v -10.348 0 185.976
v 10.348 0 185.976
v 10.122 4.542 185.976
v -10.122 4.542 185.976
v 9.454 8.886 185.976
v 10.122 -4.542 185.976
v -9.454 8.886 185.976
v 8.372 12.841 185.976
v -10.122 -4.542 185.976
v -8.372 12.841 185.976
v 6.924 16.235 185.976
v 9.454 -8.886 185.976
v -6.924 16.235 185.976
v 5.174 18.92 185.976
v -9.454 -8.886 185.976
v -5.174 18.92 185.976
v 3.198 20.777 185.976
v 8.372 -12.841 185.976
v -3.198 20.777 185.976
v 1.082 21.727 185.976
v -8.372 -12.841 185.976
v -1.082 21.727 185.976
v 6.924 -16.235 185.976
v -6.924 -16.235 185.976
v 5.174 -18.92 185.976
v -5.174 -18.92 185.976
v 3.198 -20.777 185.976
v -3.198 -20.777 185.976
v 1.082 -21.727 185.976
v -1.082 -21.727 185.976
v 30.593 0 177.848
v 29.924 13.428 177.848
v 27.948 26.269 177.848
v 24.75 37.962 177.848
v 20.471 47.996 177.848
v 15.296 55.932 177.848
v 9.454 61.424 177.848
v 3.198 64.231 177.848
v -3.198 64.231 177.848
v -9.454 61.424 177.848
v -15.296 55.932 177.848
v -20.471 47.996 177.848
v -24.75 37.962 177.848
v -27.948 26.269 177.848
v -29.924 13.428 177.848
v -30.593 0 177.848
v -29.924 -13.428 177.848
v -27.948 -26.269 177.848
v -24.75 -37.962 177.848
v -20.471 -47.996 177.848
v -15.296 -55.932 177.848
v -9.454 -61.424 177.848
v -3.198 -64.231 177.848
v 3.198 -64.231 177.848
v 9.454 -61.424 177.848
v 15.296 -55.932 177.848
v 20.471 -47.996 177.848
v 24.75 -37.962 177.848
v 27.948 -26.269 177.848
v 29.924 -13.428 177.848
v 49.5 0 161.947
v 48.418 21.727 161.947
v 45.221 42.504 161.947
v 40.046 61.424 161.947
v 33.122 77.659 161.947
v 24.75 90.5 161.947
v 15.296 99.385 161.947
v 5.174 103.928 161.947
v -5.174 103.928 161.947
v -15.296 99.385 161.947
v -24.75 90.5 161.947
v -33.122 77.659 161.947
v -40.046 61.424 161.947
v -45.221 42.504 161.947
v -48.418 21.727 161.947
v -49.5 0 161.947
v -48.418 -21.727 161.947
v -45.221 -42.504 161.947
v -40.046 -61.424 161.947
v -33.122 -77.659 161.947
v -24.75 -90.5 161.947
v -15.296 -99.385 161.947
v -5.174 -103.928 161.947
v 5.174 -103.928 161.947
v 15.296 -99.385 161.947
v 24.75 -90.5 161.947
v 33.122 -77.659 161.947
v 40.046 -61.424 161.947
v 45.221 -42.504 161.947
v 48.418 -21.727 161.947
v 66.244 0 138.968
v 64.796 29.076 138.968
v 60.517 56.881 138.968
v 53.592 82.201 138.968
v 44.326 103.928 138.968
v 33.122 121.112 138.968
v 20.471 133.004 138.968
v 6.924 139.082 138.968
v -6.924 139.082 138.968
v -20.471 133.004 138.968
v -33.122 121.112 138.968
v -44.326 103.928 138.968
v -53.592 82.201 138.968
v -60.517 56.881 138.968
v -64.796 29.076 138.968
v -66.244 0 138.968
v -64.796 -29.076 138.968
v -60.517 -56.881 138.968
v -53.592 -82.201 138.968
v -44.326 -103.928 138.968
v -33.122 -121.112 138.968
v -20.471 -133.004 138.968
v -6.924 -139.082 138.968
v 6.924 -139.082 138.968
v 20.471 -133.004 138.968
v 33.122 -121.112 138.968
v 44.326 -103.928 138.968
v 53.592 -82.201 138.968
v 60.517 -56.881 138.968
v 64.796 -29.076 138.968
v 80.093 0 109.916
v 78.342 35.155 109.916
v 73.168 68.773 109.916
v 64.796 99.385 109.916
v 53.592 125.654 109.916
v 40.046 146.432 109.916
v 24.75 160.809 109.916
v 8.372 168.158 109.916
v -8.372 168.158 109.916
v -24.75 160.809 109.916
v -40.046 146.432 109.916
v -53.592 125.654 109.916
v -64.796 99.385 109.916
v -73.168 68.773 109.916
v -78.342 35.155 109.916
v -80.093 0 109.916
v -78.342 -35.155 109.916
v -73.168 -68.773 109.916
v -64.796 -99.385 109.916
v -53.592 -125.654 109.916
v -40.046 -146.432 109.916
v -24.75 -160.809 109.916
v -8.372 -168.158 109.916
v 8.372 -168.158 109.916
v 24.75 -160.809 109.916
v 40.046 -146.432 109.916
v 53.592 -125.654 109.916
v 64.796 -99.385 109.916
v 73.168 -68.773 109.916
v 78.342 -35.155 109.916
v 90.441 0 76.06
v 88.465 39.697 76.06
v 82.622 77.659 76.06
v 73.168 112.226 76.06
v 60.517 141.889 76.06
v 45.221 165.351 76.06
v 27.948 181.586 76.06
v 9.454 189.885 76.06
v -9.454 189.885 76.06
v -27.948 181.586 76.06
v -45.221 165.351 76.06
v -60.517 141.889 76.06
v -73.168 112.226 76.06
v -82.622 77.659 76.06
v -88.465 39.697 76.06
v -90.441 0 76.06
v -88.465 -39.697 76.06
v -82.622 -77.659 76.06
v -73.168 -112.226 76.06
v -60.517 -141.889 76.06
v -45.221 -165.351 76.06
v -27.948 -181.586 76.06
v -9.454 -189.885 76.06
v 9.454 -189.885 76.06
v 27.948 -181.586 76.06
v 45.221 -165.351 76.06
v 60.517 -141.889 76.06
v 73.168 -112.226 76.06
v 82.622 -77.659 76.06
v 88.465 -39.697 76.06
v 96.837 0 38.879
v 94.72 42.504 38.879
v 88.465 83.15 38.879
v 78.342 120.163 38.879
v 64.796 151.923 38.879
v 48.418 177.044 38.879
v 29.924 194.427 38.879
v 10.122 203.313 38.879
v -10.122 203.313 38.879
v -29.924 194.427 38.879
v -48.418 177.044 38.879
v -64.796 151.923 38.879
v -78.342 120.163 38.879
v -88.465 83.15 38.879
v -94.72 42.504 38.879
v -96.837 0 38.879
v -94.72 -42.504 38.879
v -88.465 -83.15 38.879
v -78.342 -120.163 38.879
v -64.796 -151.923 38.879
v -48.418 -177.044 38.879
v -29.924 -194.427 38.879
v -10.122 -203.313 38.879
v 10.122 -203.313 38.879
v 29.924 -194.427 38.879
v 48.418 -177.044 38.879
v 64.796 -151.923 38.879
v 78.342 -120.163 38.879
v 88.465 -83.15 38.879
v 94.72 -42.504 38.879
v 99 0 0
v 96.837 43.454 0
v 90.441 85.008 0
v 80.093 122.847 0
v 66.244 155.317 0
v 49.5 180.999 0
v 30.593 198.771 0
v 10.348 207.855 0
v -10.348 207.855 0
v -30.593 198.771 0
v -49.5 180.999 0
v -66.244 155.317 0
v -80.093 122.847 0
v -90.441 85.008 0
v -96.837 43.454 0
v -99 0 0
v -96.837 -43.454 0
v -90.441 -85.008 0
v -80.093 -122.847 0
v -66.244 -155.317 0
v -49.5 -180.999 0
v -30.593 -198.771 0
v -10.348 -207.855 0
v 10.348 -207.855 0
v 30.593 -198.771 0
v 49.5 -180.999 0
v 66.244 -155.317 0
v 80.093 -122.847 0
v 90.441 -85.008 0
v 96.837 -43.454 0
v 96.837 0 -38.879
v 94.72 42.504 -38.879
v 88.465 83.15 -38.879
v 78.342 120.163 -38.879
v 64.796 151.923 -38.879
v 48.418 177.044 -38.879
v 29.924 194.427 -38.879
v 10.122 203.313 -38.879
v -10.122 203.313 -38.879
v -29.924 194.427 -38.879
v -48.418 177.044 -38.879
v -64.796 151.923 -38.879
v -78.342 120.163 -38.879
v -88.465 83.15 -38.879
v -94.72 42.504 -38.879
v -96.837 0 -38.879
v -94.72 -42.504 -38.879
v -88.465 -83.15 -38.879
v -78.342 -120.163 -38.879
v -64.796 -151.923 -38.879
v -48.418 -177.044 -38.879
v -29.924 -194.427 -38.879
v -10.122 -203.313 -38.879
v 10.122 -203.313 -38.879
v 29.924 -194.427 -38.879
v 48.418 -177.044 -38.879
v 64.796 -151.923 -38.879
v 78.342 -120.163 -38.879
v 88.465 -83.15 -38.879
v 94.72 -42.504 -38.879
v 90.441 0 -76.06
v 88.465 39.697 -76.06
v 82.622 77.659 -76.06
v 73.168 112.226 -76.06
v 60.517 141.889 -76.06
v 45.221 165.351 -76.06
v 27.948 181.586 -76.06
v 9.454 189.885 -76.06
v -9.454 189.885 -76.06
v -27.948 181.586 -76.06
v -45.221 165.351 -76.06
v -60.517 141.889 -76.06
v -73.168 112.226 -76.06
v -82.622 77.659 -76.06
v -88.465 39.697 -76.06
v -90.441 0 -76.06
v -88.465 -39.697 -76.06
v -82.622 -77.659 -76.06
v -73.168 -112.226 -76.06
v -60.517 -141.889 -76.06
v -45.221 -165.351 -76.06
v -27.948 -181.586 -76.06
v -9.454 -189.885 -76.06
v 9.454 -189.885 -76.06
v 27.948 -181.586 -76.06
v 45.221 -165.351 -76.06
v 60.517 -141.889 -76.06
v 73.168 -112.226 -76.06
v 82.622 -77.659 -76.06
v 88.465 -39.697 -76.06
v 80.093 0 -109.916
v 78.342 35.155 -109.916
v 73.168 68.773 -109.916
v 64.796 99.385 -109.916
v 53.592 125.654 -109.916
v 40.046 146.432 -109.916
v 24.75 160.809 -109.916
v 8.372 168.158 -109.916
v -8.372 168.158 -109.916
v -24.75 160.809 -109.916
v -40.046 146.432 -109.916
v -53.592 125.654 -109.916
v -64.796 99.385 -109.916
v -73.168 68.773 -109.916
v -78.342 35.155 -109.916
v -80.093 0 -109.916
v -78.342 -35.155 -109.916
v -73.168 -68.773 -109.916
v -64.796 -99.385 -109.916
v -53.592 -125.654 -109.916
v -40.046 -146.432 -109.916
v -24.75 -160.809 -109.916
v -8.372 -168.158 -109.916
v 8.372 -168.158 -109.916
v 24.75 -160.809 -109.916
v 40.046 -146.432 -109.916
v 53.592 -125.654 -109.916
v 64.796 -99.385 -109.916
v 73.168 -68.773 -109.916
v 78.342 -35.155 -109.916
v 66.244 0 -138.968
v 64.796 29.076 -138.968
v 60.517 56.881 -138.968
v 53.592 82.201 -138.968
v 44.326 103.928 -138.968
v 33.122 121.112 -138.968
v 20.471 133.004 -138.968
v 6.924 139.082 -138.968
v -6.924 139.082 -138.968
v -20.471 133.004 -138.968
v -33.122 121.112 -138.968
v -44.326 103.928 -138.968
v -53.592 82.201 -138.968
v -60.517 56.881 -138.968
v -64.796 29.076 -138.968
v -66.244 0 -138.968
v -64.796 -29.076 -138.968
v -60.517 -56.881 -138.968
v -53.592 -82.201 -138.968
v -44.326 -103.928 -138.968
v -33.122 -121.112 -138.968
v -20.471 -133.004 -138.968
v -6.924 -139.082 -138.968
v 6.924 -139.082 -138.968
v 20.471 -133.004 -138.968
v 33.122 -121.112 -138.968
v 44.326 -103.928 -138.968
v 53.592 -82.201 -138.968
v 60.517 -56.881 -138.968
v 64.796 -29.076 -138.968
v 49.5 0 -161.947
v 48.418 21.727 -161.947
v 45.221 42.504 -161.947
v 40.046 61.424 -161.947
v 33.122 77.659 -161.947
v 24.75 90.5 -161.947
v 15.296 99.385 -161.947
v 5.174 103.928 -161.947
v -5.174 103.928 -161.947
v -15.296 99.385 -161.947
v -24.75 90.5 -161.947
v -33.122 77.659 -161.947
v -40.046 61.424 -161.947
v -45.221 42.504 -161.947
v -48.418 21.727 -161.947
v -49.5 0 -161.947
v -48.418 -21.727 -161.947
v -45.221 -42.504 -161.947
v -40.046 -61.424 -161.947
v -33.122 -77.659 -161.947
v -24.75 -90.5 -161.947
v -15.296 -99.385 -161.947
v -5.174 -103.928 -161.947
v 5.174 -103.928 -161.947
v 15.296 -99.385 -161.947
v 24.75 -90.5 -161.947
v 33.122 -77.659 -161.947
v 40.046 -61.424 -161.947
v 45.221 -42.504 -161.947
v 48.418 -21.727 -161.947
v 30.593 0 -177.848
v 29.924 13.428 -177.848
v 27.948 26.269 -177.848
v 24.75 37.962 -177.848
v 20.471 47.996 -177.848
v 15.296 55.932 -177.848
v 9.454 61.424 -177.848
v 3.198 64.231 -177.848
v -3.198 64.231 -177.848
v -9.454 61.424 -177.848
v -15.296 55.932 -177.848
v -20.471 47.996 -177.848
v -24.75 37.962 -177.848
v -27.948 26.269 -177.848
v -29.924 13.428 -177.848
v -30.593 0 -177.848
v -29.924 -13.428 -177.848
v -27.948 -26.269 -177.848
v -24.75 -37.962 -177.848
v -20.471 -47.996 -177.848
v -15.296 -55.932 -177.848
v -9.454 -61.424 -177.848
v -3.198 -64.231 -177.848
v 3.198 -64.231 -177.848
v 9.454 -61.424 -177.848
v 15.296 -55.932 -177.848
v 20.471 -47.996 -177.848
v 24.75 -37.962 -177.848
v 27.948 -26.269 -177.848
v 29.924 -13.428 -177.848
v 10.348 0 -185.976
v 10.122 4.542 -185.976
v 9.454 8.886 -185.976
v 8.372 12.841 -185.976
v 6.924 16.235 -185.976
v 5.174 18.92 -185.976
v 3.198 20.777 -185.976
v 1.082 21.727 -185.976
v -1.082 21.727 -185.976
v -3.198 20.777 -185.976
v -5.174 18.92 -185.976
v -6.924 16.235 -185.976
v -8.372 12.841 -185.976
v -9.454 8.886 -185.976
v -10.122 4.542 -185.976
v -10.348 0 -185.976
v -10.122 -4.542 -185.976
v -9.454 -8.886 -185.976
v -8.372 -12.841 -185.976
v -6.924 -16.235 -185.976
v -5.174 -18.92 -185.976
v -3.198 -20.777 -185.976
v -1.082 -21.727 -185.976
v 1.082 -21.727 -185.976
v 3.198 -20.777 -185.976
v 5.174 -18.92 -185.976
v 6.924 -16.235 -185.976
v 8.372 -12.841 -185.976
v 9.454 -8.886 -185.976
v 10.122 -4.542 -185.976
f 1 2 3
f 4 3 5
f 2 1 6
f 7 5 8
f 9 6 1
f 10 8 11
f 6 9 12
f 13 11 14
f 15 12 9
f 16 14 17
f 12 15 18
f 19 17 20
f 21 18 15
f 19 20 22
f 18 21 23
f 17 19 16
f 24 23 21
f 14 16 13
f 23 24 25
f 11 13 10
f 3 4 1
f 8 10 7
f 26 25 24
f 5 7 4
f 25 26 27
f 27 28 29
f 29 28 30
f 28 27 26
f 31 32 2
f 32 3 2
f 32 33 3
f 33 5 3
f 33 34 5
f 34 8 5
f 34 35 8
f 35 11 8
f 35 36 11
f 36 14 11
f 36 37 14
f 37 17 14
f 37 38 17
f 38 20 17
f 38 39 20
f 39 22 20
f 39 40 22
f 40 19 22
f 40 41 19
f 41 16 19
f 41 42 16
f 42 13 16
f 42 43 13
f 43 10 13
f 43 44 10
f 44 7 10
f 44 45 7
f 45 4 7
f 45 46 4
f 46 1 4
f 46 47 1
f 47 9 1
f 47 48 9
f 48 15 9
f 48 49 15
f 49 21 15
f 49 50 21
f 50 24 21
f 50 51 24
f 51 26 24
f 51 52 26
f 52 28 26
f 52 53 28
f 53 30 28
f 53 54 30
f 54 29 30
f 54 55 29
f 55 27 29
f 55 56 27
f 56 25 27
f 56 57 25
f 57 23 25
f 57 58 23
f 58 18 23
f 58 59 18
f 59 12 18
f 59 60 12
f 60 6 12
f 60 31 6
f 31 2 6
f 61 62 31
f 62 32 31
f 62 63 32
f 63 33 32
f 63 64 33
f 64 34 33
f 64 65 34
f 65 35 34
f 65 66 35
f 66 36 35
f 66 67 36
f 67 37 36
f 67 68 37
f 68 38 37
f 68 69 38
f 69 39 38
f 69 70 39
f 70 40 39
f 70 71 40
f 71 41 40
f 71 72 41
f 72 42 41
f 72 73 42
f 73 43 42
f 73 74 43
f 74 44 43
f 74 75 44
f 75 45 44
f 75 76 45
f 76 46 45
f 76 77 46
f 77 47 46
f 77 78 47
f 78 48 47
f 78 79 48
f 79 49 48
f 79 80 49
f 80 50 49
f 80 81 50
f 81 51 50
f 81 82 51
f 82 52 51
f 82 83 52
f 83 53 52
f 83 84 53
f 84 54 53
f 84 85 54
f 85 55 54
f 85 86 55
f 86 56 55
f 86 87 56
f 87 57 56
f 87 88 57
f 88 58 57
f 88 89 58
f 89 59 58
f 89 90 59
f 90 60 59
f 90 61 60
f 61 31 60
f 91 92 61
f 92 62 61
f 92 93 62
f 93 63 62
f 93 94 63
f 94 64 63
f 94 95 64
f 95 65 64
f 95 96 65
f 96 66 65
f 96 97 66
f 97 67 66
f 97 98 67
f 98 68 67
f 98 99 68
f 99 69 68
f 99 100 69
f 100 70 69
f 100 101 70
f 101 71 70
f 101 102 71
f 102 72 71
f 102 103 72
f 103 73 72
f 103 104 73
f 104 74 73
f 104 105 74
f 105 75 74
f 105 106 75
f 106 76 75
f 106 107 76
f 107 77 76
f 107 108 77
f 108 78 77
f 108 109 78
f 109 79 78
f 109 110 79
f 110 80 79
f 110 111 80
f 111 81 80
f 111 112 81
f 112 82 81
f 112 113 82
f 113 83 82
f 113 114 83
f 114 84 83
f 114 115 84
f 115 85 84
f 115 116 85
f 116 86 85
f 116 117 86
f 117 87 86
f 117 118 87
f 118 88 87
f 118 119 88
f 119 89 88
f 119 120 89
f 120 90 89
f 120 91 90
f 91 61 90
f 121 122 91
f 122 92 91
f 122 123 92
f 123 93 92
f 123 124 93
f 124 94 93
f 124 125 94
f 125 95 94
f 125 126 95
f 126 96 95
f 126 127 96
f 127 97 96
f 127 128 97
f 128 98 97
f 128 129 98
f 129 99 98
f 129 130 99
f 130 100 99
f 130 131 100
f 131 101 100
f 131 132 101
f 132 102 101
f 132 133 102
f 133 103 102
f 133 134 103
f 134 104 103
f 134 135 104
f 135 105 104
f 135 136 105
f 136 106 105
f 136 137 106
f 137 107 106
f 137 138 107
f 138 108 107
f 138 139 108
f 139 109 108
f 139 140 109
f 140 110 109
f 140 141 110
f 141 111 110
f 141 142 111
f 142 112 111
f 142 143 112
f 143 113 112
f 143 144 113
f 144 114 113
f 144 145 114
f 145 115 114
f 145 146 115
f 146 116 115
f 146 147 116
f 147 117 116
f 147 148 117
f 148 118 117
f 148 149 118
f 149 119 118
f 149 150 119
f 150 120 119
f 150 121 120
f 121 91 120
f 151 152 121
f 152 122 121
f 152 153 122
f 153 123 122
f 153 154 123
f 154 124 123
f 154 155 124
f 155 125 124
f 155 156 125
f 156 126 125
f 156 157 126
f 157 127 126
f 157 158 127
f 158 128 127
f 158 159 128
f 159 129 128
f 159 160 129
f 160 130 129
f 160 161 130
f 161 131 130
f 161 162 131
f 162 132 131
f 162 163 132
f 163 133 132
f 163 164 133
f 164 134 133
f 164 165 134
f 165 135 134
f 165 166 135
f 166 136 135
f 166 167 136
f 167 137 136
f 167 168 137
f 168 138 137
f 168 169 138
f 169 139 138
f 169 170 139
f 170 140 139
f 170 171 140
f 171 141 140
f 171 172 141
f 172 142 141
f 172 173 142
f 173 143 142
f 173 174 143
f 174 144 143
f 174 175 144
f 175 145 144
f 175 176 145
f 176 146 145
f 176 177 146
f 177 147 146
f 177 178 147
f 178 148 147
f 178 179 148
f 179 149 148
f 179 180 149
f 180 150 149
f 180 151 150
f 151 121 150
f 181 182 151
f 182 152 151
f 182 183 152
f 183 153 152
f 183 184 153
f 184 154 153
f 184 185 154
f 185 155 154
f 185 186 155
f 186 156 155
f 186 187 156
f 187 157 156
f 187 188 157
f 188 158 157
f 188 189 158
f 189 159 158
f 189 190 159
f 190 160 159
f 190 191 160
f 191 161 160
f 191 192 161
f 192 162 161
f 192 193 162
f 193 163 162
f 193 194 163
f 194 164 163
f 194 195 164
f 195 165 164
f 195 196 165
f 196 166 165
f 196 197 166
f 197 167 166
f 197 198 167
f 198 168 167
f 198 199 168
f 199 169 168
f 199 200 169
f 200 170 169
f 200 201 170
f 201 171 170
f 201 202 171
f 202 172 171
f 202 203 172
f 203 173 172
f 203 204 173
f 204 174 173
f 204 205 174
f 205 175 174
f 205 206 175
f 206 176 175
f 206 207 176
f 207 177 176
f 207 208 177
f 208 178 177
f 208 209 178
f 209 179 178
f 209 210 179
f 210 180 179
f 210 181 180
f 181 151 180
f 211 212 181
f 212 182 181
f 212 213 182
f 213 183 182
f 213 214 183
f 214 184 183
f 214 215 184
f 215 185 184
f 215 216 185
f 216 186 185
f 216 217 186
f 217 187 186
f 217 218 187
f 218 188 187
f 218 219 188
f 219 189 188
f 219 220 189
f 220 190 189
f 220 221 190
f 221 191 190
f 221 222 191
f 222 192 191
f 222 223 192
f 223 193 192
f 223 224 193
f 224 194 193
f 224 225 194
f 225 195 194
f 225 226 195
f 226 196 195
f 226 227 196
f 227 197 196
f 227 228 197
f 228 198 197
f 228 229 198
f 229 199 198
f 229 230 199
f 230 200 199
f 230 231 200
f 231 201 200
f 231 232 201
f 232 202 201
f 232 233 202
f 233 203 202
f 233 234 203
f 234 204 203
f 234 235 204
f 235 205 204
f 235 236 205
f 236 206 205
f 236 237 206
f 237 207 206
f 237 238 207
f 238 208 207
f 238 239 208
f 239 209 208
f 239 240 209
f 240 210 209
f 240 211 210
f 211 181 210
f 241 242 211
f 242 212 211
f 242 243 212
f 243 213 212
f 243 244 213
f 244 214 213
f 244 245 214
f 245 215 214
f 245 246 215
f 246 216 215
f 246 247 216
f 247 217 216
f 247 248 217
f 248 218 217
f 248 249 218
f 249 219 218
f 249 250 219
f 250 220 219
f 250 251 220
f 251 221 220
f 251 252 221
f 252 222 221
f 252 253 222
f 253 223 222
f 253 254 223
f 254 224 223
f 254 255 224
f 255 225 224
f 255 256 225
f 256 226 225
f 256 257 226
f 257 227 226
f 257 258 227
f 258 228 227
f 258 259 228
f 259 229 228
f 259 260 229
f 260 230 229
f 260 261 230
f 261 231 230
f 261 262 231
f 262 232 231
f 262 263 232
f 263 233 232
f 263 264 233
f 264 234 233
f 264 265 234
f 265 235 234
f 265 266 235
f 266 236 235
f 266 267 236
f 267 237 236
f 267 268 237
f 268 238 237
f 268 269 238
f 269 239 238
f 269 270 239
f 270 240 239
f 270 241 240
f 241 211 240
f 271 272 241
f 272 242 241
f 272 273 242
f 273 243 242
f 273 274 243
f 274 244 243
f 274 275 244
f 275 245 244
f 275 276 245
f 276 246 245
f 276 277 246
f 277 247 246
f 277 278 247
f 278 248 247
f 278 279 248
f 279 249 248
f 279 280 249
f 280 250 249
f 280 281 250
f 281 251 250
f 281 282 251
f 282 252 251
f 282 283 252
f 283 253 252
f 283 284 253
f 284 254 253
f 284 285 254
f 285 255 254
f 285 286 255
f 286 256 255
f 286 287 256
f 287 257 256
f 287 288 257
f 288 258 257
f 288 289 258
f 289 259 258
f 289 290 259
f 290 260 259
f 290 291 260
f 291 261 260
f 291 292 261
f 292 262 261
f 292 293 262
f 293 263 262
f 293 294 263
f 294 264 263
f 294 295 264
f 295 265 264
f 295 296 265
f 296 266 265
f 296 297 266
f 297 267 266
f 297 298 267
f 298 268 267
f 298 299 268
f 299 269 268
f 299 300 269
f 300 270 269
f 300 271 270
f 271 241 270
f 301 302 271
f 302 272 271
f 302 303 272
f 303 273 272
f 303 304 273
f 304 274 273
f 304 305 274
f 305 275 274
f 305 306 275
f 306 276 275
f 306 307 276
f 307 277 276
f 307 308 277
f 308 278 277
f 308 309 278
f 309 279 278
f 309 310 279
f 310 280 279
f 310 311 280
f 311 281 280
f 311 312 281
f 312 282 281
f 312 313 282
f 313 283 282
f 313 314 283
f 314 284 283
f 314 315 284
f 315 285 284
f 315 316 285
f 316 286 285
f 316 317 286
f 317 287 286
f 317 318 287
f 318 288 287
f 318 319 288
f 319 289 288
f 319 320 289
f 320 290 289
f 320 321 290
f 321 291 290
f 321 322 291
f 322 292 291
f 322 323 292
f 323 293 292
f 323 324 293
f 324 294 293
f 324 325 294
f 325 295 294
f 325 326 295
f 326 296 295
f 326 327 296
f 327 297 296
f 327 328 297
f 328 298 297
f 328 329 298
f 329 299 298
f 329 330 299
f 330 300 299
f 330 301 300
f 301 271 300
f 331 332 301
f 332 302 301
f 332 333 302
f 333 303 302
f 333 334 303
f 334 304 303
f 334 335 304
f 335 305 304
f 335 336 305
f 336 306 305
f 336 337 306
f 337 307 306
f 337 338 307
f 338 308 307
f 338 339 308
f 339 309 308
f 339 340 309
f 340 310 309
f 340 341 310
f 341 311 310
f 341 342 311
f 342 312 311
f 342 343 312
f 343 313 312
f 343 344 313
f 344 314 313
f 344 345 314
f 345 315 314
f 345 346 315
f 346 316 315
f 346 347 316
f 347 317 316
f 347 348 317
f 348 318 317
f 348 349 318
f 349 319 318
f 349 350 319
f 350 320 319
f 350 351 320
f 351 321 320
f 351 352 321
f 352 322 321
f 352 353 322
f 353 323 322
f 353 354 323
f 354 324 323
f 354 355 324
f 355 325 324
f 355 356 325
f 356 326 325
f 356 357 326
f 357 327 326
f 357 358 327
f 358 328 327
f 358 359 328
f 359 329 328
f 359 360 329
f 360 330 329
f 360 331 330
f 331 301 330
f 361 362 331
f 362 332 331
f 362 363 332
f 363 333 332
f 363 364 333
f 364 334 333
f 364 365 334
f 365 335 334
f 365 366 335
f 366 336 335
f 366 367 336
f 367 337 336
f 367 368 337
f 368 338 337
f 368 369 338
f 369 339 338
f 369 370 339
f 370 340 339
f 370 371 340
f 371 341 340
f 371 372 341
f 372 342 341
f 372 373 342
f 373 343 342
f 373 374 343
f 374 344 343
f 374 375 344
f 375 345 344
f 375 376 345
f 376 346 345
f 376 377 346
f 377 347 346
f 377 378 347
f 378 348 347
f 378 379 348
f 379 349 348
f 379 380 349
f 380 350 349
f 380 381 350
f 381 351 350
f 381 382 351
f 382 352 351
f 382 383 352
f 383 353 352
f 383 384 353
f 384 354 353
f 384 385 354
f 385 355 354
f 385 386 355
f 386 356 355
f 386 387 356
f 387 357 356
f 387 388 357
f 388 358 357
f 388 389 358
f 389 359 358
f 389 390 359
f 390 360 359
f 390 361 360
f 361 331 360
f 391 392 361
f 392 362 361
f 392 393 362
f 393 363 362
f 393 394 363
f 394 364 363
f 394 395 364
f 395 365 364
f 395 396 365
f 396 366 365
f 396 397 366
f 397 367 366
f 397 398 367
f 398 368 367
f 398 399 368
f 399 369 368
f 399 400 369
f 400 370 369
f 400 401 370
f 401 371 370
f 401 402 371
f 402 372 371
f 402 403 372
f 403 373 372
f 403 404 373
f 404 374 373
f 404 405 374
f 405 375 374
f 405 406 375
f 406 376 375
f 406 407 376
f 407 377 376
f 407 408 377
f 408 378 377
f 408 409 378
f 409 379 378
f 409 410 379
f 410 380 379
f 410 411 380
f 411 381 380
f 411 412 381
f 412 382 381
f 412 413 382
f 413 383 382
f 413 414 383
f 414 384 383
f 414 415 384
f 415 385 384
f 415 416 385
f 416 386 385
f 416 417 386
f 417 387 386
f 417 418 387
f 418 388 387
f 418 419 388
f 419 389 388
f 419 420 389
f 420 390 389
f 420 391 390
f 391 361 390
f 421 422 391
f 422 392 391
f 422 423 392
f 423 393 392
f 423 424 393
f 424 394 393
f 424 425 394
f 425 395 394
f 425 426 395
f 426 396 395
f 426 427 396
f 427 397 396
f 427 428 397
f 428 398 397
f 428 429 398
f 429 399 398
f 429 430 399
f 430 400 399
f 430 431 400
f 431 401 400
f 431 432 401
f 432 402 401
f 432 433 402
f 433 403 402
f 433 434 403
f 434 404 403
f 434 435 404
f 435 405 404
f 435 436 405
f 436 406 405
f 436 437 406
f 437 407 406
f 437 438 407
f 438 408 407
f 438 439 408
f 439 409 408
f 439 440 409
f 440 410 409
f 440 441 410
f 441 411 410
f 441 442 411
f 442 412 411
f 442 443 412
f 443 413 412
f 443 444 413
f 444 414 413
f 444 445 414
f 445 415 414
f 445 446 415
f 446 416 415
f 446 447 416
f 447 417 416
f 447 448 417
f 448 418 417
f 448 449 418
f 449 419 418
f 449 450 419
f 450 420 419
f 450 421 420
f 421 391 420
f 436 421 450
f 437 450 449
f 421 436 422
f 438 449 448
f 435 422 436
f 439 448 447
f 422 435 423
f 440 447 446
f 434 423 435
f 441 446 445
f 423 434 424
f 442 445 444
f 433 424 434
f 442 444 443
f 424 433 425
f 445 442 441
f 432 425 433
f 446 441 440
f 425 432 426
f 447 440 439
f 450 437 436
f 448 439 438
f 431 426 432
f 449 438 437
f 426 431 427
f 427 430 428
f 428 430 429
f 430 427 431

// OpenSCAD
// Generated by SolidPython 1.0.1 on 2020-07-29 00:46:49


scale(v = [9, 19, 17]) {
	sphere(r = 11);
}
/***********************************************
*********      SolidPython code:      **********
************************************************
 
# import packages: SolidPython
from solid import *
from solid.utils import *
from itertools import chain, combinations, permutations


class Resize:

    def __init__(self, scad_file):
        self.scad_file = scad_file
        #self.scad_file = import_scad(scad_file)
        # cone/cylinder param:
        self.r1 = 0
        self.r2 = 0
        self.h = 0
        # rectangular prism param:
        self.w = 0
        self.l = 0
        # ellipse param:
        self.r = 0

    # import OpenScad code (file name corresponds to shape)


    # classify shape + parameters
    def assign(self, param1, param2, param3):
        if self.scad_file == 'cone.scad':
            self.r1 = param1
            self.r2 = param2
            self.h = param3
        elif self.scad_file == 'cylinder.scad':
            self.r1 = param1
            self.r2 = param2
            self.h = param3
        elif self.scad_file == 'rectangularPrism.scad':
            self.h = param1
            self.l = param2
            self.w = param3
        else:
            self.r = param1
            self.h = param2

    # resize parameters
    def iterate(self):
        x = range(3, 20, 2)
        i = 1
        if self.scad_file == 'cone.scad':
            tempList = list(permutations(x, 2))
            for temp in tempList:
                param1 = temp[0]
                param2 = temp[1]
                filepath = 'produced_scad_files/' + 'cone' + str(param1) + '_' + str(param2) + '_' + '.scad'
                scad_render_to_file(cylinder(h=param1, r1=param2, r2=0), filepath)

        elif self.scad_file == 'cylinder.scad':
            tempList = list(permutations(x, 3))
            for temp in tempList:
                param1 = temp[0]
                param2 = temp[1]
                filepath = 'produced_scad_files/' + 'cylinder' + str(param1) + '_' + str(param2) + '_' + '.scad'
                scad_render_to_file(cylinder(h=param1, r1=param2, r2=param2), filepath)

        elif self.scad_file == 'rectangularPrism.scad':
            tempList = list(permutations(x, 3))
            for temp in tempList:
                param1 = temp[0]
                param2 = temp[1]
                param3 = temp[2]
                filepath = 'produced_scad_files/' + 'rectangularPrism' + str(param1) + '_' + str(param2) + '_' + str(
                    param3) + '.scad'
                scad_render_to_file(cube(size=(param1, param2, param3)), filepath)

        elif self.scad_file == 'ellipse.scad':
            tempList = list(permutations(x, 4))
            for temp in tempList:
                param1 = temp[0]
                param2 = temp[1]
                param3 = temp[2]
                param4 = temp[3]
                filepath = 'produced_scad_files/' + 'ellipse' + str(param1) + '_' + str(param2) + '_' + str(param3) + '_' + str(param4) + '.scad'
                scad_render_to_file(scale([param1, param2, param3])(sphere(r=param4)), filepath)

    def render_to_scadfile(self):
        scad_render_to_file(scad, 'example.scad') 
 
************************************************/
